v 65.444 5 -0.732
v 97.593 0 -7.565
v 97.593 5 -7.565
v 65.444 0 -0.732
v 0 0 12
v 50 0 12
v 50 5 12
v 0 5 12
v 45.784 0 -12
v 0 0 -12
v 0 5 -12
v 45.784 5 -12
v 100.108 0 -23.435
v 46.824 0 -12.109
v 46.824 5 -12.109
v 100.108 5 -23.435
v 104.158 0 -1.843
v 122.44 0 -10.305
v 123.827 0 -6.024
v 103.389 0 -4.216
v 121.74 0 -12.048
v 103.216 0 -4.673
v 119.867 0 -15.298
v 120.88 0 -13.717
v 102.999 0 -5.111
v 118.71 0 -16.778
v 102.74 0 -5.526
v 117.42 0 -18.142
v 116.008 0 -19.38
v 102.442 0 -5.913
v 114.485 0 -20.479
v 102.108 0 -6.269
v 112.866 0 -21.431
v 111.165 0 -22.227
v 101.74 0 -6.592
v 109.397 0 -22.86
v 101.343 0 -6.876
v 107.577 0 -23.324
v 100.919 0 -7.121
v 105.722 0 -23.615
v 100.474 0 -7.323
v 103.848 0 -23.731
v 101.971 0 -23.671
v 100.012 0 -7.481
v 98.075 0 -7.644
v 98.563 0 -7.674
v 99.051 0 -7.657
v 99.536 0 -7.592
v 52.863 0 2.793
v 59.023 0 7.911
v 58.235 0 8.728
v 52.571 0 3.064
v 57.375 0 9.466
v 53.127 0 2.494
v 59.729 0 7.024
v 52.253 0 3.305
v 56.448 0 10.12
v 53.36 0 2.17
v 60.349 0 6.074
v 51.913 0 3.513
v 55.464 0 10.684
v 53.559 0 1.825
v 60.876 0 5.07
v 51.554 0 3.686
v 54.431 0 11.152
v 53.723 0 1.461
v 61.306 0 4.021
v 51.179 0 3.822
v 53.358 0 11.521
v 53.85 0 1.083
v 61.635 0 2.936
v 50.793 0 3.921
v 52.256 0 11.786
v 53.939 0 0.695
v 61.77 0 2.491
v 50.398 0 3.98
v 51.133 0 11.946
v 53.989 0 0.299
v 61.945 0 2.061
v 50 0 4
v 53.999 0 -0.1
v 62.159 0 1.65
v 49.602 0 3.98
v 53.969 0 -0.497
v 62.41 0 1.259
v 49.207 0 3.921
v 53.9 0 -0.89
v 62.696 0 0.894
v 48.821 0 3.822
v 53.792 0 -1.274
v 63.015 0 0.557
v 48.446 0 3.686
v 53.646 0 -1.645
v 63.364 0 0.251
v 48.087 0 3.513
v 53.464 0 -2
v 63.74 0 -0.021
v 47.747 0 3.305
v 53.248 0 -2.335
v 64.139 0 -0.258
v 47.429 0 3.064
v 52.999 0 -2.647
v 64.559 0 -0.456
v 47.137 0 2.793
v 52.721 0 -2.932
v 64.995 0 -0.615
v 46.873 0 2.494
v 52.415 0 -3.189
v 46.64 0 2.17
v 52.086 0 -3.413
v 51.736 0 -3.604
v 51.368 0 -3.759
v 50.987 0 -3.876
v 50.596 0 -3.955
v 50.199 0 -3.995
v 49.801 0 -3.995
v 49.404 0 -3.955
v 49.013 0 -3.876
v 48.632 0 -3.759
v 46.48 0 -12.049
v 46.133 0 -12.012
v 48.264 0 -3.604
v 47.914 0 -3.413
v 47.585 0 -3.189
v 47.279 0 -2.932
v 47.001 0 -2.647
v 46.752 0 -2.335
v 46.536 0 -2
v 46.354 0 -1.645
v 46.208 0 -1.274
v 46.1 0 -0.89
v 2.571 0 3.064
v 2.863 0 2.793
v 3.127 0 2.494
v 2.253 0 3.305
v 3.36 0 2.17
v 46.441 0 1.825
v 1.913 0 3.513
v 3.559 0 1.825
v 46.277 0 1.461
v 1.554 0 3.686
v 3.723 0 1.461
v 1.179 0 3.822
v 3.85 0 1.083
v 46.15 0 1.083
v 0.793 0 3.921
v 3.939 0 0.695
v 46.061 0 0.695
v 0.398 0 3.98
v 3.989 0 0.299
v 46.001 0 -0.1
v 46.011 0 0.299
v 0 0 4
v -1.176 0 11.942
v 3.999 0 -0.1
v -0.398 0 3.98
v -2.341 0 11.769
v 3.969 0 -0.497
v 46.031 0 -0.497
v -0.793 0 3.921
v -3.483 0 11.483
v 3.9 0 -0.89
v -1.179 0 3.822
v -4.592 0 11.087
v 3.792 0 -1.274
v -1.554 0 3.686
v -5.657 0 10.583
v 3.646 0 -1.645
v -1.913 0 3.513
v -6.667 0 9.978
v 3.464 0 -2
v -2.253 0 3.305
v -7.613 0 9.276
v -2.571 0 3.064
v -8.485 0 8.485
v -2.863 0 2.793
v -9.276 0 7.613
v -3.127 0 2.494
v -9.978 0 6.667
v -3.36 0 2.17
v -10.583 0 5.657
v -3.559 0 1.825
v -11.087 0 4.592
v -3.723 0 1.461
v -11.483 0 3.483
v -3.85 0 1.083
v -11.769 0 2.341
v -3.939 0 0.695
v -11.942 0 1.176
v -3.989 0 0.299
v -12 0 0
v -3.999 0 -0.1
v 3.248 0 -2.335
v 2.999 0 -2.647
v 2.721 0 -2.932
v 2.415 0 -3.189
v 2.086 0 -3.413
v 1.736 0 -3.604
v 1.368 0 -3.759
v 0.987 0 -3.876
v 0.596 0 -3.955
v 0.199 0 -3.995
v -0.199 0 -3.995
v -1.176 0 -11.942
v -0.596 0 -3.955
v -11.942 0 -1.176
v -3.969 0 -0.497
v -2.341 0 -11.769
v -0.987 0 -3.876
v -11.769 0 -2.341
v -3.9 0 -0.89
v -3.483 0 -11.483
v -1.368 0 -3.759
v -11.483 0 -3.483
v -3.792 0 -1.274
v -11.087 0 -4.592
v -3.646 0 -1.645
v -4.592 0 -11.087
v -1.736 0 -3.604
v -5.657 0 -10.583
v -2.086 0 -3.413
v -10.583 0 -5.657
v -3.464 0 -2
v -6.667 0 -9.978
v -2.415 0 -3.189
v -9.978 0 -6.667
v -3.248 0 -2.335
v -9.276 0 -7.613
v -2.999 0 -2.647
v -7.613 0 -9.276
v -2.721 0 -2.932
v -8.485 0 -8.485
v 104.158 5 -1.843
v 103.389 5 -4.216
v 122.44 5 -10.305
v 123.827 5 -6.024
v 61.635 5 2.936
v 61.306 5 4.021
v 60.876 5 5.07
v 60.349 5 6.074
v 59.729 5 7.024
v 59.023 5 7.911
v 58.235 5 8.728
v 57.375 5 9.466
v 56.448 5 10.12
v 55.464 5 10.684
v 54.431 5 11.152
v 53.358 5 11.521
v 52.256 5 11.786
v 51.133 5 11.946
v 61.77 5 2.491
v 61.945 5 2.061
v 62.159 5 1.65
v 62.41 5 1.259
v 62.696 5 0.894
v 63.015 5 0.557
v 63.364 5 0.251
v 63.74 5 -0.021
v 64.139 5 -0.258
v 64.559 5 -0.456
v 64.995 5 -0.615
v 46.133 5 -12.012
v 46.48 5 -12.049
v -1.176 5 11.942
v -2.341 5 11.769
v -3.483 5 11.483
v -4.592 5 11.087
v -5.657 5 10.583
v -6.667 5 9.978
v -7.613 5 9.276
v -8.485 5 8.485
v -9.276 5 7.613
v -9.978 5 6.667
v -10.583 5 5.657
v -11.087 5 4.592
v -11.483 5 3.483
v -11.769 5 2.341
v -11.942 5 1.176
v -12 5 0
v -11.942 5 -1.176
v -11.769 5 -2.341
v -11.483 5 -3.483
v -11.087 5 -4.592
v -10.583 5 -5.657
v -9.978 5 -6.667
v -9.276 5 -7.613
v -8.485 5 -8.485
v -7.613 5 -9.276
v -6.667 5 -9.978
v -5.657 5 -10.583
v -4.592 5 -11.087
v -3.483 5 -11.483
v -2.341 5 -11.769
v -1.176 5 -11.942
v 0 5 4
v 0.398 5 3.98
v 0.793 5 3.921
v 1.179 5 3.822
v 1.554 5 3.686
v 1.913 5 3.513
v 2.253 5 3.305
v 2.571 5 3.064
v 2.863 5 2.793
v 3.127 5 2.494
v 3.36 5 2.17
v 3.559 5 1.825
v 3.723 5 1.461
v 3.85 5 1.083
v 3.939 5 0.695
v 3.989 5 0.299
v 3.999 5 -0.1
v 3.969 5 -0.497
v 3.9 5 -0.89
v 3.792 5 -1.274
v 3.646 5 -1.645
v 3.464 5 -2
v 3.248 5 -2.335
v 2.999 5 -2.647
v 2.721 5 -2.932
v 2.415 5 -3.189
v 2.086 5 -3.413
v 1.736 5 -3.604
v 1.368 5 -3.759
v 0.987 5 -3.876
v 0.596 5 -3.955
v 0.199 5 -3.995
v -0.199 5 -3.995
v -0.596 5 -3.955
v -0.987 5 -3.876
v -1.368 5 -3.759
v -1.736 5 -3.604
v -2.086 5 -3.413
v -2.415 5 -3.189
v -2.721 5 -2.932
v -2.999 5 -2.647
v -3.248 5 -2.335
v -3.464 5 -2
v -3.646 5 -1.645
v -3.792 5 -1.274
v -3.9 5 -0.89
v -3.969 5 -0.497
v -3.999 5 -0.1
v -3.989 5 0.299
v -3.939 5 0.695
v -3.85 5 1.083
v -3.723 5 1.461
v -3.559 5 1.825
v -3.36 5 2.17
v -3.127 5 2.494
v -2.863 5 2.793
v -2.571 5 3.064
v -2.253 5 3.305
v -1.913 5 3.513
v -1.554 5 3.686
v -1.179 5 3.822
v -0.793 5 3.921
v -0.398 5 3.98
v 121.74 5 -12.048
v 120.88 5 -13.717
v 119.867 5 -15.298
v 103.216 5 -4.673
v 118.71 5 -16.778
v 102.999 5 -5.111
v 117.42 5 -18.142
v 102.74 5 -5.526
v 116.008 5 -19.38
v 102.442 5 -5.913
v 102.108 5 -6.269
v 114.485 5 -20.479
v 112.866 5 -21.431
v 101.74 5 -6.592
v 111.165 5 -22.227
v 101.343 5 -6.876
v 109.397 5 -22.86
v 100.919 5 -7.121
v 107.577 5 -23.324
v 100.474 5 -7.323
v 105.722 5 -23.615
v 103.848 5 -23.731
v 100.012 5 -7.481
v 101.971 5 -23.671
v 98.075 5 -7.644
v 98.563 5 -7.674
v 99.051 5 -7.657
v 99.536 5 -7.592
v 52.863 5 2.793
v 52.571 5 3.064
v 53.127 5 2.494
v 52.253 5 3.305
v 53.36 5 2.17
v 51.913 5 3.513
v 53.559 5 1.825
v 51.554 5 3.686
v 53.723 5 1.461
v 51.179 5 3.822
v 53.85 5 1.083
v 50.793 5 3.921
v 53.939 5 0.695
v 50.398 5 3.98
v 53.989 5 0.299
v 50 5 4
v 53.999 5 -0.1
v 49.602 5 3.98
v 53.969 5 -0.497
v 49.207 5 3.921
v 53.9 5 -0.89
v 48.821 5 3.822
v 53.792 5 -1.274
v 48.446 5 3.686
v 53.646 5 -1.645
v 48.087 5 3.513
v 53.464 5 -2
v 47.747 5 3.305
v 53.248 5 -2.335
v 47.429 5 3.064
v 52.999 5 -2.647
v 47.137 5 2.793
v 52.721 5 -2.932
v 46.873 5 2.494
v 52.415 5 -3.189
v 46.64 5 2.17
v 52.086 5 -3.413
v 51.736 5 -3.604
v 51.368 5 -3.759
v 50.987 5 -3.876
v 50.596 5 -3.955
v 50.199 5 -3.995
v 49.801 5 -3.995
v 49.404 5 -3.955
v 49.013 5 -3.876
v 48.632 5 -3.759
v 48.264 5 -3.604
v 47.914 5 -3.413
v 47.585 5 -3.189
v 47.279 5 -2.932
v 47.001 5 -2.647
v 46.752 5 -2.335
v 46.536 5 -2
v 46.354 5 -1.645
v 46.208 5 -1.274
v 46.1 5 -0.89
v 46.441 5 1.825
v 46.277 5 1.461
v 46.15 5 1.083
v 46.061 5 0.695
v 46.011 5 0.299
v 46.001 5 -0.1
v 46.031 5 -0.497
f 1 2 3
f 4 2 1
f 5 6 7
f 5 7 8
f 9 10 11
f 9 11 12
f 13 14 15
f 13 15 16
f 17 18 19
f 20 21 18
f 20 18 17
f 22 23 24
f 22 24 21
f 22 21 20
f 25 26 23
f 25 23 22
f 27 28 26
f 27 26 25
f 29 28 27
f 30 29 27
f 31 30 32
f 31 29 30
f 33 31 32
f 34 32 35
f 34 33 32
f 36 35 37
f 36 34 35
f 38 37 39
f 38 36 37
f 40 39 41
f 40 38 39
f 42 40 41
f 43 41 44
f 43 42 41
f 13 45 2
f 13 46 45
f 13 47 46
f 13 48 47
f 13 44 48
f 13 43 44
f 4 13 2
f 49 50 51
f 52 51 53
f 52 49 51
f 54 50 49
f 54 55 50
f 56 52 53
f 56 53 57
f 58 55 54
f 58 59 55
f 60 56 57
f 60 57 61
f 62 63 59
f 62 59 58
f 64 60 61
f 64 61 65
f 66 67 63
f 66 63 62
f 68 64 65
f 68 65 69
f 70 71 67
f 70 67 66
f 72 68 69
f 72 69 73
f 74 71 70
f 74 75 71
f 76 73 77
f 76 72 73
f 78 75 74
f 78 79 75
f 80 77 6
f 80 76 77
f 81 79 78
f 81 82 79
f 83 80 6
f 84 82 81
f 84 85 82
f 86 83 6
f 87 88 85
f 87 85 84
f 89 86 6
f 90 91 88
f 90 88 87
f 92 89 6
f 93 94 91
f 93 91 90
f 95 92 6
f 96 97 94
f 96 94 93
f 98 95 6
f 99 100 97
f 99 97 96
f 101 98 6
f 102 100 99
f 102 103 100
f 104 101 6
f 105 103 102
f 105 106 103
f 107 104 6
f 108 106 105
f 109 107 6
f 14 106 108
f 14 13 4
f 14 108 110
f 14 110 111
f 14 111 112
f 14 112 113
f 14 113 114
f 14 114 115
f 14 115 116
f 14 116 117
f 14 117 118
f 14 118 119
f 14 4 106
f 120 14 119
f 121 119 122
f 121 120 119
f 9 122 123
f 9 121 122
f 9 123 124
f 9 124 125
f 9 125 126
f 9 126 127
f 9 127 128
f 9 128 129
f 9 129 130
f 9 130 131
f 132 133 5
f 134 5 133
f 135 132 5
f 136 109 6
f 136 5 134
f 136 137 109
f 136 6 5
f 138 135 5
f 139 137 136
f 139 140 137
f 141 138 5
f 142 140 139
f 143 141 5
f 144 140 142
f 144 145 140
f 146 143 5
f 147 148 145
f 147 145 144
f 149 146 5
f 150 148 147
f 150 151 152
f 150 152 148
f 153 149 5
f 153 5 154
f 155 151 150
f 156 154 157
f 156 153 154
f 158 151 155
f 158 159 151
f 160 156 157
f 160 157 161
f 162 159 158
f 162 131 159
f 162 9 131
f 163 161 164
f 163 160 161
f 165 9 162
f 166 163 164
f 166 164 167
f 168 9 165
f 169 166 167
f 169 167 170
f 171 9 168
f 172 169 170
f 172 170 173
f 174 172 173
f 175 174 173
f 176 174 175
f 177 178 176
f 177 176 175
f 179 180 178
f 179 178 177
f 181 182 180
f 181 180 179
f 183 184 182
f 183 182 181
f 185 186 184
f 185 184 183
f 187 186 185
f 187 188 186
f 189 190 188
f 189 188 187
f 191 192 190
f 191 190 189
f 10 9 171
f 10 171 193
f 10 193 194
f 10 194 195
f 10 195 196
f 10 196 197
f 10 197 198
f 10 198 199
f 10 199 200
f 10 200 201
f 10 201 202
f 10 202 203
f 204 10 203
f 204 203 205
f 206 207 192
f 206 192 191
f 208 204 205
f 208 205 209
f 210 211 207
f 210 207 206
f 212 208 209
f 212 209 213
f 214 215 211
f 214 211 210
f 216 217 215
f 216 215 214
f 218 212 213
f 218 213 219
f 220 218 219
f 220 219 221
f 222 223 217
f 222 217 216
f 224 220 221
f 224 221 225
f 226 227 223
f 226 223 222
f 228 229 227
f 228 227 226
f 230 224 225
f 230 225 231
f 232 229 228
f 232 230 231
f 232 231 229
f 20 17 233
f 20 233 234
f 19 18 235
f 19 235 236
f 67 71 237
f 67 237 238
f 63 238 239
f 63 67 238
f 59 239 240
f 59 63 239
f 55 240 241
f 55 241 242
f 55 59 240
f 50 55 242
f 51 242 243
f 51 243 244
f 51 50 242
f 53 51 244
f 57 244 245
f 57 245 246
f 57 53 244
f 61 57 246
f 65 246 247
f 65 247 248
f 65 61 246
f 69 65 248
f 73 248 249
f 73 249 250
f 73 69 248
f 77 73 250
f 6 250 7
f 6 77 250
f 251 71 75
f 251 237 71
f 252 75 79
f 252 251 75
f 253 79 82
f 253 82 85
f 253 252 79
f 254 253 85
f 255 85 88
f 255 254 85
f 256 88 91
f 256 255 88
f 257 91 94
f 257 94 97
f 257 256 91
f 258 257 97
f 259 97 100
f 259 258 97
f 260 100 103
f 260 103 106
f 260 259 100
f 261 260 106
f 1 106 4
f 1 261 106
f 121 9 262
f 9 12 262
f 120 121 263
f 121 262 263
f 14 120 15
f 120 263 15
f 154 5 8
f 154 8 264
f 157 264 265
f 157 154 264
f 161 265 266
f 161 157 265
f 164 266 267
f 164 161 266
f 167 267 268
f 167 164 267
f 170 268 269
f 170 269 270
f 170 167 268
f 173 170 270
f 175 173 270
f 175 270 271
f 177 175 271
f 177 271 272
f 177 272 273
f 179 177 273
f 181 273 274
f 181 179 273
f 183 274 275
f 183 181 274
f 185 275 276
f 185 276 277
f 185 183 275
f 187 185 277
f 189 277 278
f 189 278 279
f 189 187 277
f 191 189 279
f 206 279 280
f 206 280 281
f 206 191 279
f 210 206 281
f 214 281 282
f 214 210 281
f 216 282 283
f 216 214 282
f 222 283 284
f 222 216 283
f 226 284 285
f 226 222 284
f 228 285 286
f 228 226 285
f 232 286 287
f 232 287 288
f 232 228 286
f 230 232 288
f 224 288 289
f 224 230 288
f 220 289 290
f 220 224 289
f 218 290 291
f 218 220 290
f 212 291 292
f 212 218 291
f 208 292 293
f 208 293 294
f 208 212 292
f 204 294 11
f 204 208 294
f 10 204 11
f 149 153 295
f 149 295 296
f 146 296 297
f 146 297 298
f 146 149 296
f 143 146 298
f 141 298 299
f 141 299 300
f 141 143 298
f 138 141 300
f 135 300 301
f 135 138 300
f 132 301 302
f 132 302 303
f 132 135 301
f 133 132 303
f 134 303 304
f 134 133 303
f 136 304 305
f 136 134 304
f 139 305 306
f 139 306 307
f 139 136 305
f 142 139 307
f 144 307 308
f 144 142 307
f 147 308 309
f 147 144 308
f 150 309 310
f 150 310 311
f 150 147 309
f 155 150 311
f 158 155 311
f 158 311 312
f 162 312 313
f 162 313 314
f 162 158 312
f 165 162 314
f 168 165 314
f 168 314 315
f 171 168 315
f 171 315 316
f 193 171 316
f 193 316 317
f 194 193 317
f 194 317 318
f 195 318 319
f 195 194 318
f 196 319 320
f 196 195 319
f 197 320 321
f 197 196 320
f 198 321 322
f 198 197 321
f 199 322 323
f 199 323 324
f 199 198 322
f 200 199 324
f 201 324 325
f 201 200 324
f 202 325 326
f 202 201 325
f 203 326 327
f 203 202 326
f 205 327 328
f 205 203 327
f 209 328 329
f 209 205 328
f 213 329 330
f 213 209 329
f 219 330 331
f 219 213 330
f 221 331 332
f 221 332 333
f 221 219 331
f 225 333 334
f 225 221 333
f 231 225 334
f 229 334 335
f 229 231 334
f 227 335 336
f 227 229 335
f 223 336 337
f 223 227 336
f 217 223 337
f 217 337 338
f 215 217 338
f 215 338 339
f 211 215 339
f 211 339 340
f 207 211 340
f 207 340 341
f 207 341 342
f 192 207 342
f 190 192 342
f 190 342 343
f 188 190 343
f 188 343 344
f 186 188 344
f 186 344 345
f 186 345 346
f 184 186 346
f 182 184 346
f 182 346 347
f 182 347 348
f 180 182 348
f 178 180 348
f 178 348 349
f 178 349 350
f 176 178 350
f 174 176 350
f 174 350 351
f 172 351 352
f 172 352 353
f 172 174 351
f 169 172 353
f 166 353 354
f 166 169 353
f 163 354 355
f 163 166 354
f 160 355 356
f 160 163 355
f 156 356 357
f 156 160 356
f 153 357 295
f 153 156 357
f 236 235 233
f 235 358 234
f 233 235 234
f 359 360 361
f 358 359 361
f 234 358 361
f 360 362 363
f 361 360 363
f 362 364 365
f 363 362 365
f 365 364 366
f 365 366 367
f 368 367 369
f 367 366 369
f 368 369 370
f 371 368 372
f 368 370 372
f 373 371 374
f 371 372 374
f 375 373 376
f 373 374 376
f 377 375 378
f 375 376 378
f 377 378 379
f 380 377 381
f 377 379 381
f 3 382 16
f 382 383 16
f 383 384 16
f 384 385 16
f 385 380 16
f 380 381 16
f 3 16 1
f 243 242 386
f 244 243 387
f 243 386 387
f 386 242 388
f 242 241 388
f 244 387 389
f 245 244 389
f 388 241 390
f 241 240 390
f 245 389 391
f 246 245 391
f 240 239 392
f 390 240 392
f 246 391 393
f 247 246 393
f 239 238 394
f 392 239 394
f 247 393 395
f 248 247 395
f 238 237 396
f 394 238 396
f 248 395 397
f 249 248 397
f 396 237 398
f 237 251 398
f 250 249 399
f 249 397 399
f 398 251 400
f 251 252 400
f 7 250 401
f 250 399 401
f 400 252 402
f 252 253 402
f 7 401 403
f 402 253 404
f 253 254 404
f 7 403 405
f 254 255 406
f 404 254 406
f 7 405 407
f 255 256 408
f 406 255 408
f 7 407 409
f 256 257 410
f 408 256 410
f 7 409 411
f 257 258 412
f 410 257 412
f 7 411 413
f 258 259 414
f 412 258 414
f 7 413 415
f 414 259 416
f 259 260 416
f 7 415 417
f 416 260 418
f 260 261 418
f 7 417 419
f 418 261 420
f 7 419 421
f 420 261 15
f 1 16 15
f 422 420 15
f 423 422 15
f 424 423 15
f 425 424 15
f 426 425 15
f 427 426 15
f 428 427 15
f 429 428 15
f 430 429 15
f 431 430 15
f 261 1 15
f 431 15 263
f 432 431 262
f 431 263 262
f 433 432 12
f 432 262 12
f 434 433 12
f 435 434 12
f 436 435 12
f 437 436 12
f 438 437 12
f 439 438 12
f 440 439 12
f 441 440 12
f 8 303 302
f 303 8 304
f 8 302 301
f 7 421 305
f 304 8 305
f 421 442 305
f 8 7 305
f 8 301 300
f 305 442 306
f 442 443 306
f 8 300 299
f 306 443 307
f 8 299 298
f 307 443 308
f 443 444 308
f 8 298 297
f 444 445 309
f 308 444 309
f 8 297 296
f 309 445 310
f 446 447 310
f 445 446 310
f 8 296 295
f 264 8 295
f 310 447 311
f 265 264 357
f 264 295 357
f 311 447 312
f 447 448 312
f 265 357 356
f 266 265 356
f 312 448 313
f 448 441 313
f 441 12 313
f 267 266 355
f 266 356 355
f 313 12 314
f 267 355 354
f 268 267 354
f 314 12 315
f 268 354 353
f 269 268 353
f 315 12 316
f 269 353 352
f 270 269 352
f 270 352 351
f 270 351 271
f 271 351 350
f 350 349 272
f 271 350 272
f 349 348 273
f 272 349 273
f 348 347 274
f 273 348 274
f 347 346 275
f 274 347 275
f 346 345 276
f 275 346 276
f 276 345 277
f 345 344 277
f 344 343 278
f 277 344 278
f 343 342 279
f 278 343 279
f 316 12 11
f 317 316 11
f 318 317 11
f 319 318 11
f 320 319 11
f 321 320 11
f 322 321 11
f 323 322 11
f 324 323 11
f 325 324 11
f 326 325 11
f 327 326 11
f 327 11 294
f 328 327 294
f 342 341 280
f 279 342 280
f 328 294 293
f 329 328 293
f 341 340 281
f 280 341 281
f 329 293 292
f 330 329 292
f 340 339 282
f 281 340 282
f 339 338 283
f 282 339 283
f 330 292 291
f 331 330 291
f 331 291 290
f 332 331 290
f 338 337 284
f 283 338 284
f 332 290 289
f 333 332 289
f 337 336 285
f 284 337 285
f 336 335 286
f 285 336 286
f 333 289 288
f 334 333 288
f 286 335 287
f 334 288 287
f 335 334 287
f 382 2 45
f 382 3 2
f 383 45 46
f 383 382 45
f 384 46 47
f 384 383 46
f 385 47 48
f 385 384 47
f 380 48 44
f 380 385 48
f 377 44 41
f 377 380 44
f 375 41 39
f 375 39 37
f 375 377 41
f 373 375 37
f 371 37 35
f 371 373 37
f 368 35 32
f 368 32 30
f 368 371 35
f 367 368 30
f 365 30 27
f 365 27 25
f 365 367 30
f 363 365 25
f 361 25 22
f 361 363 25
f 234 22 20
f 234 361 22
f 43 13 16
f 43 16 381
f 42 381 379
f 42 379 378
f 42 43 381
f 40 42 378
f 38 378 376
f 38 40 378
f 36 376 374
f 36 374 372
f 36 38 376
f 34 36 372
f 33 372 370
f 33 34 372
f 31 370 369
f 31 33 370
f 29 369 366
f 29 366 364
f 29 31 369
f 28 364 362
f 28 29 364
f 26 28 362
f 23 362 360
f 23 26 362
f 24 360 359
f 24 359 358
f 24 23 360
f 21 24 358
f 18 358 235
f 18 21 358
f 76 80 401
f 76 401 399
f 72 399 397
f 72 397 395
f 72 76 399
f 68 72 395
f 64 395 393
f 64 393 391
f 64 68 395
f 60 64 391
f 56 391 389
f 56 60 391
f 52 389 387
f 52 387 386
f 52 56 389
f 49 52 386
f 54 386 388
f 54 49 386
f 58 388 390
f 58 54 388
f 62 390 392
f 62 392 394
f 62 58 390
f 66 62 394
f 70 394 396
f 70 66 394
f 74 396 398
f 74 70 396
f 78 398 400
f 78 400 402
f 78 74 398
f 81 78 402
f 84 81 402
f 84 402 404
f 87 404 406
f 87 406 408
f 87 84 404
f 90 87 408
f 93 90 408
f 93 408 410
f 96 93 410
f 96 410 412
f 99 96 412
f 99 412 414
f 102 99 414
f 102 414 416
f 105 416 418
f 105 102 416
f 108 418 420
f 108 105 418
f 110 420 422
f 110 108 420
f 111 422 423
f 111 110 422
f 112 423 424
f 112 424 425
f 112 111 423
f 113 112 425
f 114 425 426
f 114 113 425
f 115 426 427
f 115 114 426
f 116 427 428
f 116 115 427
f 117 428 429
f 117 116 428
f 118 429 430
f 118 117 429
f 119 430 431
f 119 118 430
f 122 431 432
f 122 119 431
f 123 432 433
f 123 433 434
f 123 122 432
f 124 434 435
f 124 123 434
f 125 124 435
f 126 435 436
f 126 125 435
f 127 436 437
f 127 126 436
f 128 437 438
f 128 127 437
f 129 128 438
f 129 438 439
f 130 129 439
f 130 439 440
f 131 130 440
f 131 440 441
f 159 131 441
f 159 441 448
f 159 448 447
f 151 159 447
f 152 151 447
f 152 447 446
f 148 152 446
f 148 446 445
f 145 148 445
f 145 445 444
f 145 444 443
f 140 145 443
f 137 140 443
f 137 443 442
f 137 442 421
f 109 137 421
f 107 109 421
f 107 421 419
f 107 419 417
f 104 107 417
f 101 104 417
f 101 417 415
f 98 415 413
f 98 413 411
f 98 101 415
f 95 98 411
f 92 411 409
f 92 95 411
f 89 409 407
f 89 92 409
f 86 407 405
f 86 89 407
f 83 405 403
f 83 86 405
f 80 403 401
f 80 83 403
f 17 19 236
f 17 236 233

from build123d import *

# Parameters (mm, degrees)
SKETCH1_R           = 4
BOSS_EXTRUDE1_DEPTH = 5
FILLET1_R           = 5


with BuildPart() as part:
    # Sketch1 → Boss-Extrude1 (new body)
    with BuildSketch(Plane(origin=(0, 0, 0), x_dir=(1, 0, 0), z_dir=(0, 1, 0))):
        with BuildLine():
            Line((0, 12), (46.309546143, 12))
            Line((46.309546143, 12), (100.107664183, 23.435142995))
            ThreePointArc((100.107664183, 23.435142995), (113.686830565, 20.974303457), (122.439553034, 10.304751439))
            Line((122.439553034, 10.304751439), (123.826560512, 6.023839123))
            Line((123.826560512, 6.023839123), (104.157567187, 1.843065531))
            Line((104.157567187, 1.843065531), (102, 8.502262467))
            Line((102, 8.502262467), (62, 0))
            ThreePointArc((62, 0), (58.485281374, -8.485281374), (50, -12))
            Line((50, -12), (0, -12))
            ThreePointArc((0, -12), (-12, 0), (0, 12))
        make_face()
        with Locations(Location((0, 0, 0), (0, 0, 270))):
            Circle(SKETCH1_R, mode=Mode.SUBTRACT)
        with Locations(Location((50, 0, 0), (0, 0, 270))):
            Circle(SKETCH1_R, mode=Mode.SUBTRACT)
    extrude(amount=BOSS_EXTRUDE1_DEPTH)

    # Fillet1
    fillet1_edges = [part.edges().sort_by_distance(p)[0] for p in [
        (102, 2.5, -8.502262467),
        (62, 2.5, 0),
        (46.309546143, 2.5, -12),
    ]]
    fillet(fillet1_edges, radius=FILLET1_R)


solid = part.part
